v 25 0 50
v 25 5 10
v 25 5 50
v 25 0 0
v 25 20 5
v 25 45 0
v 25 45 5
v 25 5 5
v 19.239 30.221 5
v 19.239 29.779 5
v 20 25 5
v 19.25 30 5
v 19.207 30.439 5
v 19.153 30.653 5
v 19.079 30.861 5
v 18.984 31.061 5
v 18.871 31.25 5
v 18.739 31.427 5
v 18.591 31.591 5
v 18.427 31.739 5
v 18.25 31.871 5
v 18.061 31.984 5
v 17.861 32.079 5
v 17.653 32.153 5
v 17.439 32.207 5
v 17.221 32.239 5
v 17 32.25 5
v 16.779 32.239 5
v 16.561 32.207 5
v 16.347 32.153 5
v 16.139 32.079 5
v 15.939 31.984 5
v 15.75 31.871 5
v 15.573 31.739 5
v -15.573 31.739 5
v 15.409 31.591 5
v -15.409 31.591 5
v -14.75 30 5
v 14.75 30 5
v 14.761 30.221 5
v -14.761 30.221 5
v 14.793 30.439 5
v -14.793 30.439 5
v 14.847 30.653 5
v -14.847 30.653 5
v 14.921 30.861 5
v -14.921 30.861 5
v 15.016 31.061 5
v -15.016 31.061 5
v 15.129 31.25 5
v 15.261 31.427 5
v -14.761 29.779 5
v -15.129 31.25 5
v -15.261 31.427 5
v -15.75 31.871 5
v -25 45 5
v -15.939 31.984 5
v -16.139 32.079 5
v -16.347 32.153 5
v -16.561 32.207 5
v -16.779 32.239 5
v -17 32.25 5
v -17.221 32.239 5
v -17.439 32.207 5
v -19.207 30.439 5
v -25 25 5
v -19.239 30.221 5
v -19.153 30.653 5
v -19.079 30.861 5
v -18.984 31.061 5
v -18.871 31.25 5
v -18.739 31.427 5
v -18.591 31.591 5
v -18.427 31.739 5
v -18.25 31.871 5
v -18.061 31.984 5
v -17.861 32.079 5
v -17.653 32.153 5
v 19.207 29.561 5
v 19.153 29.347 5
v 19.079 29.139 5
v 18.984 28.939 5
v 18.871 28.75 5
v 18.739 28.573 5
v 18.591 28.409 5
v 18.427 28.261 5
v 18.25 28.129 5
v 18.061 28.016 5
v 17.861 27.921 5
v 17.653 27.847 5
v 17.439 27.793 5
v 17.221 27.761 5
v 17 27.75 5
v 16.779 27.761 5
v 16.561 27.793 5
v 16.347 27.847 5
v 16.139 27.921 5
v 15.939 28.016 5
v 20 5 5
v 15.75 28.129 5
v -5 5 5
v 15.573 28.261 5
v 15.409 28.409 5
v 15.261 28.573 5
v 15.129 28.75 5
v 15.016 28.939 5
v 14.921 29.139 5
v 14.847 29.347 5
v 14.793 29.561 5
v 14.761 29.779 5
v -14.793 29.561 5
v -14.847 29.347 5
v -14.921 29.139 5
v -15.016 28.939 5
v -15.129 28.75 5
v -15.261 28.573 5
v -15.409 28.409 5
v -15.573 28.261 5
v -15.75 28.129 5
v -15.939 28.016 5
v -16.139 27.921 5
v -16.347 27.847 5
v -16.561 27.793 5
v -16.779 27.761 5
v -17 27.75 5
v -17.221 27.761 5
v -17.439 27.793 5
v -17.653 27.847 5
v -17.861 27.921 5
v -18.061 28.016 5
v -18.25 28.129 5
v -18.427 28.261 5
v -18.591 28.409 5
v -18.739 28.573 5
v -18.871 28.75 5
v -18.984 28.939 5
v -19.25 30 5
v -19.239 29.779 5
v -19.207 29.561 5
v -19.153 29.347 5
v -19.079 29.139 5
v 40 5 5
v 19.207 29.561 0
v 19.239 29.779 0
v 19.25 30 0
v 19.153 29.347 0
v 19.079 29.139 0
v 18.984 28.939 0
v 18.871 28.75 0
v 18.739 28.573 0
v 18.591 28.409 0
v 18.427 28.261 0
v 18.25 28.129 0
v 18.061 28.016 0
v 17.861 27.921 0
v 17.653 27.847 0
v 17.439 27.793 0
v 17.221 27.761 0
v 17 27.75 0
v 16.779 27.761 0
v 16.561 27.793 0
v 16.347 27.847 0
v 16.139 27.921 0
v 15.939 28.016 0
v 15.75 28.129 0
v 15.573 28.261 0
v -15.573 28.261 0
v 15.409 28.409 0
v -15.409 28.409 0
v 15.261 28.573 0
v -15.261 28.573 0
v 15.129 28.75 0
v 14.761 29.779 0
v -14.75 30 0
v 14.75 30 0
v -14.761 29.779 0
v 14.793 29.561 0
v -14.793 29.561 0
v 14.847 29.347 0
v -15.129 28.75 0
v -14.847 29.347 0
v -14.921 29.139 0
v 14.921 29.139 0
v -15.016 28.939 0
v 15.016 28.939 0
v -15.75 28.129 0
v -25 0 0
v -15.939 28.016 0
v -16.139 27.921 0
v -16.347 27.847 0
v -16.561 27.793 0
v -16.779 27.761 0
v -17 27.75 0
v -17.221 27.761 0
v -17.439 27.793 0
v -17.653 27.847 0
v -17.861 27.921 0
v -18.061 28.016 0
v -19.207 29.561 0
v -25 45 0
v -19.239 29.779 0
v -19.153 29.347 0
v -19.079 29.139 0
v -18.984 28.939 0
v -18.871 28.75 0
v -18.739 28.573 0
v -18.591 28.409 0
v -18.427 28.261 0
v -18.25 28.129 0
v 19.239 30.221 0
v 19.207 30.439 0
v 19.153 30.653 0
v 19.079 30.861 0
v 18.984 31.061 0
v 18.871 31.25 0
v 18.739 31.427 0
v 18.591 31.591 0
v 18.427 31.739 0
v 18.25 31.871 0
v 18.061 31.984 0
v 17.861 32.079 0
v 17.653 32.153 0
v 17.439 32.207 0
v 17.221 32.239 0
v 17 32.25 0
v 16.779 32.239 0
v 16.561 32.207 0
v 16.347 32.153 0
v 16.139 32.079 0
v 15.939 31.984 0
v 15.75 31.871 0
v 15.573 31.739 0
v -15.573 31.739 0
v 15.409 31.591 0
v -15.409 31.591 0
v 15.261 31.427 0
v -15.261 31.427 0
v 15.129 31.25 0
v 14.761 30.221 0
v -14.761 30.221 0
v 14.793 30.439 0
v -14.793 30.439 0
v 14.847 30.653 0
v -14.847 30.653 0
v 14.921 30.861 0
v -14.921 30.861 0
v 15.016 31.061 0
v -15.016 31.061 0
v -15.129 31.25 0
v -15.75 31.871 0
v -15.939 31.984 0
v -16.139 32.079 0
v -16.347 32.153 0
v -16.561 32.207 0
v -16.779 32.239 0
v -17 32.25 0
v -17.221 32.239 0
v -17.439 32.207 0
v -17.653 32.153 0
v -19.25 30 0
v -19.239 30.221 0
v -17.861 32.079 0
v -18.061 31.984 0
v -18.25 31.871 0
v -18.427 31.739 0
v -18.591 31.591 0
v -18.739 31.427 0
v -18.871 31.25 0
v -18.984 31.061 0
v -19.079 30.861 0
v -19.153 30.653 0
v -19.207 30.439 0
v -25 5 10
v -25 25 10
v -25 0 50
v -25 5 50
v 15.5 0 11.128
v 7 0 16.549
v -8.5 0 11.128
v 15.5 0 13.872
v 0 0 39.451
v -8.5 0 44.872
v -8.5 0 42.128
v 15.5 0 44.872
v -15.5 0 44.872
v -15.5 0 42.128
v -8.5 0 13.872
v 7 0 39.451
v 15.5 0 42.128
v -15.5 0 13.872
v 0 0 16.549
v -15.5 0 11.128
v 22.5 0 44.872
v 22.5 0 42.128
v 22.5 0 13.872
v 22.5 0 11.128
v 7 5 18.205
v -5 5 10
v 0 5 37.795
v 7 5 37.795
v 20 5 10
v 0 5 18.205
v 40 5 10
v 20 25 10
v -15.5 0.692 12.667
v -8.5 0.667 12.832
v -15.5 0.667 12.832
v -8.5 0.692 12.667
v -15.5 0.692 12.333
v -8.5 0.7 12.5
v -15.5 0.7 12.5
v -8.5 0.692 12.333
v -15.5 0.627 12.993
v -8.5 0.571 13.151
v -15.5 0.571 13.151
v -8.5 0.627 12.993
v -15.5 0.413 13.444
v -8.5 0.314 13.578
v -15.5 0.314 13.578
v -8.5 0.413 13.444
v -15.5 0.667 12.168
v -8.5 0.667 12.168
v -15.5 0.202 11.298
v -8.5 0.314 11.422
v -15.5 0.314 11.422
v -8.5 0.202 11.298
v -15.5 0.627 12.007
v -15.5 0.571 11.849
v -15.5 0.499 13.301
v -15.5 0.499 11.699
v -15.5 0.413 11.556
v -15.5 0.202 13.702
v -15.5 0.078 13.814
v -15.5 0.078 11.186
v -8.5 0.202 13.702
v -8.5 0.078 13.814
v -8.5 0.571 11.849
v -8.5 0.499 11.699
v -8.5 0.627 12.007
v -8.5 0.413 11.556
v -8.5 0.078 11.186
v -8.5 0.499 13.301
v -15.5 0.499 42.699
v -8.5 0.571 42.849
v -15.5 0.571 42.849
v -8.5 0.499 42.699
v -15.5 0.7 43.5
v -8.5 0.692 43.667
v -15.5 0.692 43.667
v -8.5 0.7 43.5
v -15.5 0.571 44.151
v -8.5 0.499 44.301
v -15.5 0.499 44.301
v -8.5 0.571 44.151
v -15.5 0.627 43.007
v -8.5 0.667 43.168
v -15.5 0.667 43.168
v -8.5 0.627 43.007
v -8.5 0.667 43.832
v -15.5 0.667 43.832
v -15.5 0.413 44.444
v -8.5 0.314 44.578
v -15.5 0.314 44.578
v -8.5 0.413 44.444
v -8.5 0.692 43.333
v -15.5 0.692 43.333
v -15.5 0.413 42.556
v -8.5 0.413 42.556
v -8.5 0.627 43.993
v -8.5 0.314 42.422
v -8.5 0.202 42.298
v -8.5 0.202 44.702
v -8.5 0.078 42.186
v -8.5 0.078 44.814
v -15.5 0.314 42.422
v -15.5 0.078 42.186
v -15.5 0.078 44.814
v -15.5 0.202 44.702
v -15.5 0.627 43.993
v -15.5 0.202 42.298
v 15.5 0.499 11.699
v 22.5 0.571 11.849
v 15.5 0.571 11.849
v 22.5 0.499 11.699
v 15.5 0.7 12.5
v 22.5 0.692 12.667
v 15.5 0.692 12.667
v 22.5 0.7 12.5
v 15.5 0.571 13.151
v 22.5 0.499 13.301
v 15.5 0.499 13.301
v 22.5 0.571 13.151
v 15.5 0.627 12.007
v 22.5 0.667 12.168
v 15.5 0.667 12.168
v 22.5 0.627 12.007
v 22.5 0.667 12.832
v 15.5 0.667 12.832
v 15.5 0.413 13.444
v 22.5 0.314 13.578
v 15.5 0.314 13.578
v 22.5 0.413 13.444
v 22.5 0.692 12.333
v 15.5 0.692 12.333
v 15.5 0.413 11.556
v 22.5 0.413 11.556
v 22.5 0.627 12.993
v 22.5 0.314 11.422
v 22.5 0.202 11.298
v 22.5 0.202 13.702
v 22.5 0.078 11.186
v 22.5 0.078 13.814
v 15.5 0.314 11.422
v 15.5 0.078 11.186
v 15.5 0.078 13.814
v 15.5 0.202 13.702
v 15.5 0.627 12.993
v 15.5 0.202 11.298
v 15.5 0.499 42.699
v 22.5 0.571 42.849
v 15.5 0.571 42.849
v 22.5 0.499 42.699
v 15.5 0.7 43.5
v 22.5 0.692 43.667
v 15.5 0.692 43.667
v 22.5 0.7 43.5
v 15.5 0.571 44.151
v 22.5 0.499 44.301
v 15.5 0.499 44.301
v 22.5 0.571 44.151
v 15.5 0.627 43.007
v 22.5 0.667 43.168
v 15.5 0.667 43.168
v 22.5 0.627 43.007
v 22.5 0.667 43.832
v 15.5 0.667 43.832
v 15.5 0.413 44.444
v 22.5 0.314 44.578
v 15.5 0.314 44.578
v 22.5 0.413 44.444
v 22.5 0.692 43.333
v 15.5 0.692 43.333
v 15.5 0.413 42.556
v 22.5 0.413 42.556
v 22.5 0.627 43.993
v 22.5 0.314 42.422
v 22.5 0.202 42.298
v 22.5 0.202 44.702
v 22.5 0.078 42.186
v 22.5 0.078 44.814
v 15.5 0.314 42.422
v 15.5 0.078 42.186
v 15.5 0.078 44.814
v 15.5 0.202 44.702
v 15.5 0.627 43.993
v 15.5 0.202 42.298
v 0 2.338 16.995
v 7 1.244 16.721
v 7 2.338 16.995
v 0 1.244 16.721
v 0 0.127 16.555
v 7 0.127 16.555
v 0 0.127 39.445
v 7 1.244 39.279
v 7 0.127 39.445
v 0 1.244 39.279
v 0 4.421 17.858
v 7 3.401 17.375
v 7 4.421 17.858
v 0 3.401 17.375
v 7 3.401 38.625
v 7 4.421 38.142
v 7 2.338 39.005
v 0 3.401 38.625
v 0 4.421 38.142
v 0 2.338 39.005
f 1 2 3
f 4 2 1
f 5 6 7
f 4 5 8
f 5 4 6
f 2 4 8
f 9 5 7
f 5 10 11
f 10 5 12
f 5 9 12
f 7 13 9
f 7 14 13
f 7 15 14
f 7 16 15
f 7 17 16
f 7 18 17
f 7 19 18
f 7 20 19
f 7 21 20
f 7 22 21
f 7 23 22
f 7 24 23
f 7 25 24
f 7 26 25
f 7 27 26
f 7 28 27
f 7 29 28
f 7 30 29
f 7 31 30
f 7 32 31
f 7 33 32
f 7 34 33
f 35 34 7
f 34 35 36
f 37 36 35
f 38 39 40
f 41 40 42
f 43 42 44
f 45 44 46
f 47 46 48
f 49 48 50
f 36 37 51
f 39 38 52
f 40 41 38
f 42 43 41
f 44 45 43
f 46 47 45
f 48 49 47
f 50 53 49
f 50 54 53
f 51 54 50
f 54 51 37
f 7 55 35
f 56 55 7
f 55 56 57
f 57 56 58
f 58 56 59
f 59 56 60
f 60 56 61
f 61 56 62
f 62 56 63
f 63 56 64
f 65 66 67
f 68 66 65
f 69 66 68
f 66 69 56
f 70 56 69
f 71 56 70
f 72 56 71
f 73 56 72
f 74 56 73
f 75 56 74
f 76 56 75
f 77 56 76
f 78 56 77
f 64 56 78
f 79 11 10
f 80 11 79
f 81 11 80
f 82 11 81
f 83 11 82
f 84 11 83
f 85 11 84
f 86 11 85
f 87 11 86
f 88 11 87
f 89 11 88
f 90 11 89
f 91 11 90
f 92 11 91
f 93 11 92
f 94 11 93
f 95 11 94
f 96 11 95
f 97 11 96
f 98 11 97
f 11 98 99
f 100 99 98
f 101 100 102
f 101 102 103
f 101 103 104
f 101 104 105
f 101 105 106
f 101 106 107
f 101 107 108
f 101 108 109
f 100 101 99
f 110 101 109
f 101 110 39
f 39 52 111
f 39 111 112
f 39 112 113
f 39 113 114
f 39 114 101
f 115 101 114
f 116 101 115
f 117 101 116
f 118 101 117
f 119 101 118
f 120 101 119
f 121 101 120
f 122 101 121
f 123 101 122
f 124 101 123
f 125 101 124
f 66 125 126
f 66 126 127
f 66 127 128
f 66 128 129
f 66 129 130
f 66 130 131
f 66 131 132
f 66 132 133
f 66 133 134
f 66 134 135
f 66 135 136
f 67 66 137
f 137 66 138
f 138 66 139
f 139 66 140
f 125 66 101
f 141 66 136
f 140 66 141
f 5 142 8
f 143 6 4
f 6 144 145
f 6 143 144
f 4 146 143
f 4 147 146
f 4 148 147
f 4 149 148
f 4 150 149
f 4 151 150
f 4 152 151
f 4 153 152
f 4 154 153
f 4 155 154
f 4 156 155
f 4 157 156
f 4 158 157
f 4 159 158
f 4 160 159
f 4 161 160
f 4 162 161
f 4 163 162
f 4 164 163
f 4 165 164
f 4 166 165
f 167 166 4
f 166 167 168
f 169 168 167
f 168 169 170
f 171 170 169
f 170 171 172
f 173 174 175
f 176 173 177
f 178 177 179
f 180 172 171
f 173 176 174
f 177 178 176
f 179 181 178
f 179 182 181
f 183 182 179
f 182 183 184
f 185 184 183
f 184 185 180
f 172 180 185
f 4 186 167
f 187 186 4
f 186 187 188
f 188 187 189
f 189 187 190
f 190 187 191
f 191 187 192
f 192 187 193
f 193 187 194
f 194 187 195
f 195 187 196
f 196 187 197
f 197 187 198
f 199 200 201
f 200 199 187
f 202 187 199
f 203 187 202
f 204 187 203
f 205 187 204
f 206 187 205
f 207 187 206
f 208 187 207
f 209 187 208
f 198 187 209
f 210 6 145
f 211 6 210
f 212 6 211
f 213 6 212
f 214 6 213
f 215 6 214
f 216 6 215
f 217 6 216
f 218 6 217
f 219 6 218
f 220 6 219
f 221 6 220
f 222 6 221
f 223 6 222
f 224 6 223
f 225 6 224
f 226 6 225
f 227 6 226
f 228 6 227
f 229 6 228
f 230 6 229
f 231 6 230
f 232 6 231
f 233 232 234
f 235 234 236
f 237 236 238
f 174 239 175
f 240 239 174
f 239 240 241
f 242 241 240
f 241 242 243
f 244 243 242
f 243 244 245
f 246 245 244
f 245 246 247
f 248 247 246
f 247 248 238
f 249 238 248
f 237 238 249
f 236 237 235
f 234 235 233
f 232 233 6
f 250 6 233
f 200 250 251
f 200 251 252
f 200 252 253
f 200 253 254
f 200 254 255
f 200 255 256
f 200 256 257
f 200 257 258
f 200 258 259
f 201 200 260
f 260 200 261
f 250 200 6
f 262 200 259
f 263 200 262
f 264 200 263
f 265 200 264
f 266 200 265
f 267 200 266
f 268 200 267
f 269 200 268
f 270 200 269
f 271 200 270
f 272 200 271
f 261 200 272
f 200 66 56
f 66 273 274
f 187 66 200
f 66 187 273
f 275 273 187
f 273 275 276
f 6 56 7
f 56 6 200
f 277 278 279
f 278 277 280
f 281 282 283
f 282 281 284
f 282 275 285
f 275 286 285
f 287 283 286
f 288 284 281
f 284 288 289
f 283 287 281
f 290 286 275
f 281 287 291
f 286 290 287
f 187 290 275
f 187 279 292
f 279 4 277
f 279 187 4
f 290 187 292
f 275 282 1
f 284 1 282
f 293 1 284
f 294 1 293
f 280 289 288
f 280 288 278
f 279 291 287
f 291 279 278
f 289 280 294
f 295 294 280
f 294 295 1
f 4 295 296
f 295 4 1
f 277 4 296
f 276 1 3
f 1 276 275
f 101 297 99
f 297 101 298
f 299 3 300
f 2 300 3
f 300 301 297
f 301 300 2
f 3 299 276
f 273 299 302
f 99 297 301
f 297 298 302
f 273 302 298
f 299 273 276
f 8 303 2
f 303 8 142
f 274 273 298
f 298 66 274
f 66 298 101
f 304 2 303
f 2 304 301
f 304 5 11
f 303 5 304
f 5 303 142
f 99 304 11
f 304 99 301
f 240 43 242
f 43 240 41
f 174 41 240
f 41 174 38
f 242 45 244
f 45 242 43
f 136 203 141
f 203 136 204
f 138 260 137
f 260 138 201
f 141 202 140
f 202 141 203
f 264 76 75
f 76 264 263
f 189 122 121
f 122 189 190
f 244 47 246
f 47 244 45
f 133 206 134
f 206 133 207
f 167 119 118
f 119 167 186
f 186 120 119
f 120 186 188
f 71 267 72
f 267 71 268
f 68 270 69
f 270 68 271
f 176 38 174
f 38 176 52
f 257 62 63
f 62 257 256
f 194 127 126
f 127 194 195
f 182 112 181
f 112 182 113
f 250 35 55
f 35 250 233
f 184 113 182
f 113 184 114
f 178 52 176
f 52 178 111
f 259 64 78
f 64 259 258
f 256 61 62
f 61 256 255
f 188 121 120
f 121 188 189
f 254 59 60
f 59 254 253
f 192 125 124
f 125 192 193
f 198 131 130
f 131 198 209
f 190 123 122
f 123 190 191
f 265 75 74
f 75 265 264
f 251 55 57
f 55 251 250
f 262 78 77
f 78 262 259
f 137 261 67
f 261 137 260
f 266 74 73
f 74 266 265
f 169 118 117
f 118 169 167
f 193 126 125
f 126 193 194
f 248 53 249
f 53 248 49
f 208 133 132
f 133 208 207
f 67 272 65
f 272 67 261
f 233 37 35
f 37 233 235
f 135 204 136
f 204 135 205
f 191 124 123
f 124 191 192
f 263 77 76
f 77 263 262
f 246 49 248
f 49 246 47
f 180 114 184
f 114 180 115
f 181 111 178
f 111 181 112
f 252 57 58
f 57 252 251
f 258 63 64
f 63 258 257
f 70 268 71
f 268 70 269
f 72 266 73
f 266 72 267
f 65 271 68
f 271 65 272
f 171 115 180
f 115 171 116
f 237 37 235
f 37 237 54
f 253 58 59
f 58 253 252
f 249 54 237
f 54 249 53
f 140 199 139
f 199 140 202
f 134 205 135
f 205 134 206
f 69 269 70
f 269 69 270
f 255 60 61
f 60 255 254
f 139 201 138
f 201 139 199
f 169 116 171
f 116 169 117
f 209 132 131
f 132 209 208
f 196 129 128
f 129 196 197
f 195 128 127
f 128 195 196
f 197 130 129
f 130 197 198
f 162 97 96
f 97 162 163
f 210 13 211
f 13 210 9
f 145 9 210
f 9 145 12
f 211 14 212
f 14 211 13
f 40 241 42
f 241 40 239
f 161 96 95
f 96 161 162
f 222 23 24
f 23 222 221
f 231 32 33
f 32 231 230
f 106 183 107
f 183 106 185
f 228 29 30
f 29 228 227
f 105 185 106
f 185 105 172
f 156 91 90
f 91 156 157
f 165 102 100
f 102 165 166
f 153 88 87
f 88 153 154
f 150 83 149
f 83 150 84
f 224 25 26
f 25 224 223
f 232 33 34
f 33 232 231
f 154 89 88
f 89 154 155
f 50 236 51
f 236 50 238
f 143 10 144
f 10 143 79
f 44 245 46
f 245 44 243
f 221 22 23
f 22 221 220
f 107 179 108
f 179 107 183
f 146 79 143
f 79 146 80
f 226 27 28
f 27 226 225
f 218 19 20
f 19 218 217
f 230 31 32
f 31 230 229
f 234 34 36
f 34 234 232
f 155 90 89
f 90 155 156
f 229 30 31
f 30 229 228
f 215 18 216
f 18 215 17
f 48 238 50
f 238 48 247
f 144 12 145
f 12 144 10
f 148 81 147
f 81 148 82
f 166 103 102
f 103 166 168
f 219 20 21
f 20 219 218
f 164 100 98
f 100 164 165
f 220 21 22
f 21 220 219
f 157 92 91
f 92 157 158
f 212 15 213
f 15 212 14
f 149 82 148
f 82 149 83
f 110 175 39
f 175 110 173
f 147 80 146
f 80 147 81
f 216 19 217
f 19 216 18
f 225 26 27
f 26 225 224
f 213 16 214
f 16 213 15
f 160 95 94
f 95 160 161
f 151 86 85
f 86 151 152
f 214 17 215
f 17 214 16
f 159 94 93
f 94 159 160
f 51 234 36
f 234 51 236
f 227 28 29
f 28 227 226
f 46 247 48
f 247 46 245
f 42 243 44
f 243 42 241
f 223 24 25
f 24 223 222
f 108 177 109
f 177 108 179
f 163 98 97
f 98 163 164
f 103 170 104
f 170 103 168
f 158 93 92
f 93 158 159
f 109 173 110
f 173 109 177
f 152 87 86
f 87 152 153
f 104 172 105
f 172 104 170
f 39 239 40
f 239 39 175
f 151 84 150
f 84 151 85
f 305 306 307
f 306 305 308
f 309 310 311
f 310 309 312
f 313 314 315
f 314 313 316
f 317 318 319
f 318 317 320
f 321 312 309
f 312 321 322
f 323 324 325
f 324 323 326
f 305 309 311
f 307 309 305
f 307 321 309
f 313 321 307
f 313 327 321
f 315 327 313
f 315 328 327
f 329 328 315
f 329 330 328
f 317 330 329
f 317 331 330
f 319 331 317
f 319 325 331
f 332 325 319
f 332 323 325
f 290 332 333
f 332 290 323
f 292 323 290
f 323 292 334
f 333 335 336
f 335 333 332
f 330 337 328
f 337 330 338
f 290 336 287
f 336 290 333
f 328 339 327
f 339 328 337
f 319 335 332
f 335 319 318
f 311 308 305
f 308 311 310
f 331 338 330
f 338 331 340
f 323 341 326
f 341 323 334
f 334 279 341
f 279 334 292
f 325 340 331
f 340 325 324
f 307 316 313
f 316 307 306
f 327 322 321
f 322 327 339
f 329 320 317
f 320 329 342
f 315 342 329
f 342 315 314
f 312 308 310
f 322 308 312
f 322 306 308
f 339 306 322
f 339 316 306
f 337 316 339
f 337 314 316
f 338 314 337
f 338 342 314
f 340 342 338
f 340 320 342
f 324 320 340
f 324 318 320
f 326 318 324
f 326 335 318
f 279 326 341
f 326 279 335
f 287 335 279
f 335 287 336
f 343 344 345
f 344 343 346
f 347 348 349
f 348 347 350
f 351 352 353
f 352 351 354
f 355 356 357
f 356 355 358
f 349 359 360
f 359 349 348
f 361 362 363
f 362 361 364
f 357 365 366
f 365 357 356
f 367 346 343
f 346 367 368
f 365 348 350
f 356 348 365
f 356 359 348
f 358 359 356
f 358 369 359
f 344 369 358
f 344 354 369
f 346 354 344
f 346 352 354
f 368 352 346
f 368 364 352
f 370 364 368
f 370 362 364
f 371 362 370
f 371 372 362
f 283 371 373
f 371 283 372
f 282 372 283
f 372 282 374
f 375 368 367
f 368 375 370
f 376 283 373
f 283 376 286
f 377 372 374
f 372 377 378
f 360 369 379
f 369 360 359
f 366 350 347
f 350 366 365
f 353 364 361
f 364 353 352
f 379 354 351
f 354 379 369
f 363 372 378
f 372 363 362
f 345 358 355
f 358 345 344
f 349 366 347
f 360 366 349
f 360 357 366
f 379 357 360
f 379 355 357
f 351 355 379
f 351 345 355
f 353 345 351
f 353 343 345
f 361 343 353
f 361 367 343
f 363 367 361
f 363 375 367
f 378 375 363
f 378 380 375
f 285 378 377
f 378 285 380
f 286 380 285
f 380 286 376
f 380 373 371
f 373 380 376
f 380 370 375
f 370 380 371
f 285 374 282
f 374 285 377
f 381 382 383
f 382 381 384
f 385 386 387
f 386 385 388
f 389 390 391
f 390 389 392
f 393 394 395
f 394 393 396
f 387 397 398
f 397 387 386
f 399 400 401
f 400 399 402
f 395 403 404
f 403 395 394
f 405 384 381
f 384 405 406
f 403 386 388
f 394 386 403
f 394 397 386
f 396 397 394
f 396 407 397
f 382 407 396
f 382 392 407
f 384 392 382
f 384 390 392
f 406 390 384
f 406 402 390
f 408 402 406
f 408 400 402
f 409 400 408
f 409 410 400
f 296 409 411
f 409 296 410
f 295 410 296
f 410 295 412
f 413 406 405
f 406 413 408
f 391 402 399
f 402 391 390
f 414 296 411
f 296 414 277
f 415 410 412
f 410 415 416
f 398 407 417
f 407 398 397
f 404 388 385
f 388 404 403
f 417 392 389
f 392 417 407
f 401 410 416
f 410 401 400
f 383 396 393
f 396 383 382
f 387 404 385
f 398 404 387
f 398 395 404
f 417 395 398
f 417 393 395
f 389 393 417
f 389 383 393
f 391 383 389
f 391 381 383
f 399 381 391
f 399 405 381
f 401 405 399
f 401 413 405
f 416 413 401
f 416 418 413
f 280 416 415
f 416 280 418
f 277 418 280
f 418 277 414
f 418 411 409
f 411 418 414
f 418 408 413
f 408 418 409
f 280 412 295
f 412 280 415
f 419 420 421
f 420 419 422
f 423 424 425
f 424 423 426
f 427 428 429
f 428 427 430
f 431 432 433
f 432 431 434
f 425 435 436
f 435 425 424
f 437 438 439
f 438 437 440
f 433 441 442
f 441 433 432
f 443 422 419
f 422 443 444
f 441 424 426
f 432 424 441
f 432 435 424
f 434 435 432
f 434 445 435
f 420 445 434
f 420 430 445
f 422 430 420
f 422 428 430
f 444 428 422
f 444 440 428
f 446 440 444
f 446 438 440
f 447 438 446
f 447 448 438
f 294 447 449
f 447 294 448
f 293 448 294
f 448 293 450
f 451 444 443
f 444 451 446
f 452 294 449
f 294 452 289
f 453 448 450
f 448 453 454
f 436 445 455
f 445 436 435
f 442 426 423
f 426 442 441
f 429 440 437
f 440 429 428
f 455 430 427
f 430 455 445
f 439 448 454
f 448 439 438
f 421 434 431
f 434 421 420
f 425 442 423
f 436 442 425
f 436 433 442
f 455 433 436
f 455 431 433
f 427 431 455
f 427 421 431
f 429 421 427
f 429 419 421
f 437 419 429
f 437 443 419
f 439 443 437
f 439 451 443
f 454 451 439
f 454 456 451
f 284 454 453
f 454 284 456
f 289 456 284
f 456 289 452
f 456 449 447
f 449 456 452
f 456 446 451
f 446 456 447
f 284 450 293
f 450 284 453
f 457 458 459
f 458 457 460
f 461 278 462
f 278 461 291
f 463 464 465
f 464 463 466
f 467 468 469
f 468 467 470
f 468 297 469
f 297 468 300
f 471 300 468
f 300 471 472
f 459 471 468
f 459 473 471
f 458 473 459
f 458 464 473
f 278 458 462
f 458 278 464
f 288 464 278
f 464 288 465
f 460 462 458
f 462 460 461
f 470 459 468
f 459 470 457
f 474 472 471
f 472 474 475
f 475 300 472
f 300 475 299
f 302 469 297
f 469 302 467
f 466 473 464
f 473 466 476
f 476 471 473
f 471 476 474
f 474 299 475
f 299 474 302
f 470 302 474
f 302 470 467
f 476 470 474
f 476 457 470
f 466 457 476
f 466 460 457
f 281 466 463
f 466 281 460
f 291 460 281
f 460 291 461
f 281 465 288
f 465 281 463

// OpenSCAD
// L-shaped NEMA 17 Stepper Motor Mounting Bracket - Corrected
// Designed for a syringe pump application.

// --- Dimensions ---
// Base Plate
base_x_min = -25;
base_x_max = 25;
base_y_min = 0;
base_y_max = 45;
base_z_min = 0;
base_z_max = 5;

// Base Plate Holes (M4)
m4_hole_d = 4.5;
m4_hole_x1 = -17;
m4_hole_x2 = 17;
m4_hole_y = 30;

// Vertical Motor Plate
vert_x_min = -25;
vert_x_max = 25;
vert_y_min = 0;
vert_y_max = 5;
vert_z_min = 0;
vert_z_max = 50;

// Motor Boss Hole (Centering)
boss_d = 23;
boss_x = 0;
boss_z = 28;

// M3 Screw Holes (Motor Plate)
m3_hole_d = 3.4;
m3_pattern_size = 31;

// Gussets
gusset_thick = 5;
gusset_leg_y = 20;
gusset_leg_z = 20;

$fn = 64;

// --- Main Assembly ---

difference() {
    union() {
        // 1. Base Plate
        translate([base_x_min, base_y_min, base_z_min])
            cube([base_x_max - base_x_min, base_y_max - base_y_min, base_z_max]);
        
        // 2. Vertical Motor Plate
        // Standing on the back edge of the base (y=0 to 5)
        translate([vert_x_min, vert_y_min, 0])
            cube([vert_x_max - vert_x_min, vert_y_max - vert_y_min, vert_z_max]);
            
        // 3. Gussets
        // Left Gusset: x from -25 to -20, right angle at y=5, z=5
        // In YZ plane, vertices: (5,5), (5+20, 5), (5, 5+20)
        // We translate it to the left edge (x=-25)
        translate([base_x_min, 5, 5])
            rotate([0, 0, 0]) // Already in YZ plane relative to local origin
            linear_extrude(height = gusset_thick)
            polygon(points = [[0, 0], [gusset_leg_y, 0], [0, gusset_leg_z]]);
            
        // Right Gusset: x from 20 to 25, right angle at y=5, z=5
        translate([base_x_max - gusset_thick, 5, 5])
            linear_extrude(height = gusset_thick)
            polygon(points = [[0, 0], [gusset_leg_y, 0], [0, gusset_leg_z]]);
    }

    // --- Negative Geometry (Cuts) ---
    
    // M4 Holes in Base Plate (Vertical through-holes)
    for (hx = [m4_hole_x1, m4_hole_x2]) {
        translate([hx, m4_hole_y, -1])
            cylinder(h = base_z_max + 2, d = m4_hole_d);
    }

    // Motor Boss Hole (Through the vertical plate along Y axis)
    // Center x=0, z=28, through the plate (y=0 to 5)
    translate([boss_x, -1, boss_z])
        rotate([0, 90, 0])
        cylinder(h = vert_y_max + 2, d = boss_d);

    // M3 Screw Holes in Vertical Plate (4 holes on 31mm square pattern)
    // Centered on the boss hole (0, 28)
    for (sx = [-1, 1], sz = [-1, 1]) {
        translate([sx * (m3_pattern_size / 2), -1, boss_z + sz * (m3_pattern_size / 2)])
            rotate([0, 90, 0])
            cylinder(h = vert_y_max + 2, d = m3_hole_d);
    }
}
